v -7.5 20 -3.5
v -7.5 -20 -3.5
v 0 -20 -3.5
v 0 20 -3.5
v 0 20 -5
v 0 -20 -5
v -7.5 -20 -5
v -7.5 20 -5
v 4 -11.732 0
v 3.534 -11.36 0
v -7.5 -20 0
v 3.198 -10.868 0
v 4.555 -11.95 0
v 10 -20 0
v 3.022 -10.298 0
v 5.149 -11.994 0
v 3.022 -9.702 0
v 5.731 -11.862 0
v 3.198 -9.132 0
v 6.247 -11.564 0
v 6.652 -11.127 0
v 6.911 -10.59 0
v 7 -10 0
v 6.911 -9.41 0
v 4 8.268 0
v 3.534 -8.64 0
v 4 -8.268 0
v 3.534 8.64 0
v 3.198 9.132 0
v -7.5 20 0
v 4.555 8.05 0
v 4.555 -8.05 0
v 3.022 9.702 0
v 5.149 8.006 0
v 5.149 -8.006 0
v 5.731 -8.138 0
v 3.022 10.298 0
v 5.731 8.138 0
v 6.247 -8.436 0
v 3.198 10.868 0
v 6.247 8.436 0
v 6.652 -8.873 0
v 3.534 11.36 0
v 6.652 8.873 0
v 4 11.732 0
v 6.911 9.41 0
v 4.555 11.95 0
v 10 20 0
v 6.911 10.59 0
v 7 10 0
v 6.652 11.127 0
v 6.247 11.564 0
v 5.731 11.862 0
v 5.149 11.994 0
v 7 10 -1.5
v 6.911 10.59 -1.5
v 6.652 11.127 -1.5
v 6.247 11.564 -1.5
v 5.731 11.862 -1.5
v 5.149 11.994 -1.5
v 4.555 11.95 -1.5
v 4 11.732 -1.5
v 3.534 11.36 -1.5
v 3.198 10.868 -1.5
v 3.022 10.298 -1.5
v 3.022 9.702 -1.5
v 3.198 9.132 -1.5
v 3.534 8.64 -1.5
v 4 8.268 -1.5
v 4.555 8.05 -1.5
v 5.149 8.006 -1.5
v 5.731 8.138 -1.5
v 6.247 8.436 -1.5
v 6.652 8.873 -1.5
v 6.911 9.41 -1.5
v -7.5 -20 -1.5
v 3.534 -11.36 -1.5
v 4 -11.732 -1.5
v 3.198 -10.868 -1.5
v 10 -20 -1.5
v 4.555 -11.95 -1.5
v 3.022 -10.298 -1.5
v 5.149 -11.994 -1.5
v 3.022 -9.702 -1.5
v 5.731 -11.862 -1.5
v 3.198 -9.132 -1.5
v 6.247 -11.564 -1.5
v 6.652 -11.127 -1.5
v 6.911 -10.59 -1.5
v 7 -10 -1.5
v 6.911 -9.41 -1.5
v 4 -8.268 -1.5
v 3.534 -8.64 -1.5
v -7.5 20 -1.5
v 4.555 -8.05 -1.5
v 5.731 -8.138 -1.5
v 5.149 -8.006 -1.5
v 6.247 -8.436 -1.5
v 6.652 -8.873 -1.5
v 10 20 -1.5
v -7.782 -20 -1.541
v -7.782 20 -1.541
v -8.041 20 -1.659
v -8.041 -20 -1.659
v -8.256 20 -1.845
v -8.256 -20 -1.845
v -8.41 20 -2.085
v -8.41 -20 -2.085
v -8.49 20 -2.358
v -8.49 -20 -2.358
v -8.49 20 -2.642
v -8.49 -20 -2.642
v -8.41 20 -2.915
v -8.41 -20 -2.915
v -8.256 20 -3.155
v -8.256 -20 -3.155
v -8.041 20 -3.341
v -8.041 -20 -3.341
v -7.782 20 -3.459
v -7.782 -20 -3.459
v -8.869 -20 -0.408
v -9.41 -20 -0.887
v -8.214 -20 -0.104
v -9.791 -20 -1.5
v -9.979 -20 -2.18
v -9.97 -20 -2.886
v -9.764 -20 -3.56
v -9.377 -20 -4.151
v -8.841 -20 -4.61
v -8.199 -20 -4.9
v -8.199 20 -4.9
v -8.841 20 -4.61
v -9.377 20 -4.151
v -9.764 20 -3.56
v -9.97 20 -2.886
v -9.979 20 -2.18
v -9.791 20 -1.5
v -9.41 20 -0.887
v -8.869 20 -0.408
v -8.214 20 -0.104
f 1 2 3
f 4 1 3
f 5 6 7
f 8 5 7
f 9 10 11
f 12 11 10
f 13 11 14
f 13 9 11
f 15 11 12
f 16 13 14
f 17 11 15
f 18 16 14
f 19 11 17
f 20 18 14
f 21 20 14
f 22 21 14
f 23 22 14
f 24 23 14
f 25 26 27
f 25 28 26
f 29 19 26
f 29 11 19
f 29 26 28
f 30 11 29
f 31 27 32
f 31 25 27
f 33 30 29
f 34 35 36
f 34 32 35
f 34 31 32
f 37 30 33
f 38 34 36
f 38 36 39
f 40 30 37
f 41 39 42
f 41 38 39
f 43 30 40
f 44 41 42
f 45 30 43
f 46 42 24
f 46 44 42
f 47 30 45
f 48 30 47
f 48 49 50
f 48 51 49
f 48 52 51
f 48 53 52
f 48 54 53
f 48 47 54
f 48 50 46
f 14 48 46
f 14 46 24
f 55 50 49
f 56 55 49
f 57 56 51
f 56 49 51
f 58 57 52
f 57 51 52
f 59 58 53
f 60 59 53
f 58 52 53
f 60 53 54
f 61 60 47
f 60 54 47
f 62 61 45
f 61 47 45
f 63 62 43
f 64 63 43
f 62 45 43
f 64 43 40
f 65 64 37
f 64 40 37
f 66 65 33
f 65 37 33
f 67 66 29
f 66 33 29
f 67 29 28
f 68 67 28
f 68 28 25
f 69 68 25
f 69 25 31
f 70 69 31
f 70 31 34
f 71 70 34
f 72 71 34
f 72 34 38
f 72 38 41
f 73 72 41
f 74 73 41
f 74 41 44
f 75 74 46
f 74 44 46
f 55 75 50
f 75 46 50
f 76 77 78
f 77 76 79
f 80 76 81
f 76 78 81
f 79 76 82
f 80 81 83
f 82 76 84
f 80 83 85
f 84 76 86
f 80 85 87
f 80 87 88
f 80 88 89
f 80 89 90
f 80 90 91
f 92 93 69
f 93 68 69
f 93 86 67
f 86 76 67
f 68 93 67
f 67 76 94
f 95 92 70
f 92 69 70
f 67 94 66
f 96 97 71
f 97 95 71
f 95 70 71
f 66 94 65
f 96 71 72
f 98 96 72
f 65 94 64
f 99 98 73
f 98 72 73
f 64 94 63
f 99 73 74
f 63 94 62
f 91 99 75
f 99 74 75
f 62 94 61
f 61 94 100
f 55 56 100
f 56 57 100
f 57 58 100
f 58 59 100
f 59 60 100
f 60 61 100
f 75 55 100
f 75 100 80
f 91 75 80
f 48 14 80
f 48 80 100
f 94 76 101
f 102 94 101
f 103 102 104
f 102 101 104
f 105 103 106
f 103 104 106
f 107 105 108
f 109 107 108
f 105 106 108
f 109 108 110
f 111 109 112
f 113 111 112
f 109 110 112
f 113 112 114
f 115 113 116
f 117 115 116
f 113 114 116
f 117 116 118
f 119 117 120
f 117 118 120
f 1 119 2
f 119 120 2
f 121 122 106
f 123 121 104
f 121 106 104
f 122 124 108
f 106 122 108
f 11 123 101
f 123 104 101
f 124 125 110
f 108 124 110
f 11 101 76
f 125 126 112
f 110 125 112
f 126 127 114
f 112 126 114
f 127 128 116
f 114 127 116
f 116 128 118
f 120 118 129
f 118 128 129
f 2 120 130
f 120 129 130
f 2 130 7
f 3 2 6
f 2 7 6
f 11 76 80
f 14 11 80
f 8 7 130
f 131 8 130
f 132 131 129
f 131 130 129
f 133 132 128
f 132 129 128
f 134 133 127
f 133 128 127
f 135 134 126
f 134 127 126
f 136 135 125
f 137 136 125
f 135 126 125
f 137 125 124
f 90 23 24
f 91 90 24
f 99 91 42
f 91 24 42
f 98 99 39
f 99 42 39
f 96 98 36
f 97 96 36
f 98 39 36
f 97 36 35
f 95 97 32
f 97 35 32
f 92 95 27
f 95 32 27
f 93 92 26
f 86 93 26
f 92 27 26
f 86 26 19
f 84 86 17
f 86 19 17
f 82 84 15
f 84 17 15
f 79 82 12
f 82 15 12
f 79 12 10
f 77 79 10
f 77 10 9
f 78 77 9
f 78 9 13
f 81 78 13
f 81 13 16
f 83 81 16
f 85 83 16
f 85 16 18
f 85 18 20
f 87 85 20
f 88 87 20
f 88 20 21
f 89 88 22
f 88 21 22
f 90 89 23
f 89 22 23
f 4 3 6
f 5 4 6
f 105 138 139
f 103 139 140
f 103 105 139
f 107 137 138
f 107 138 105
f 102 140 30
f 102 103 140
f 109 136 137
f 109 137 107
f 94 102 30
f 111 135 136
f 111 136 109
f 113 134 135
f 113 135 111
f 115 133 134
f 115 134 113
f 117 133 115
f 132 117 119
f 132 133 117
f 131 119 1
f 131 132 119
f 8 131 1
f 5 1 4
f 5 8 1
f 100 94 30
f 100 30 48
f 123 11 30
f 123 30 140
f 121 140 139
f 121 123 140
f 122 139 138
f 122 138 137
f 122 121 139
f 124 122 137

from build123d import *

# Parameters (mm, degrees)
SKETCH_1_W             = 20
SKETCH_1_H             = 40
SKETCH_1_R             = 2
SM_BASE_FLANGE_1_DEPTH = 1.5
OTHER_START            = -20
OTHER_1_DEPTH          = 40
OTHER_1_2_DEPTH        = 40


# Read off the part's stored shape, not the designer's step: 褶边1
# Sheet-metal steps are written as plain solids
with BuildPart() as part:
    # Sketch 1 → 基体-法兰1 (new body)
    with BuildSketch(Plane.XY):
        Rectangle(SKETCH_1_W, SKETCH_1_H)
        with Locations((5, 10)):
            Circle(SKETCH_1_R, mode=Mode.SUBTRACT)
        with Locations((5, -10)):
            Circle(SKETCH_1_R, mode=Mode.SUBTRACT)
    extrude(amount=-SM_BASE_FLANGE_1_DEPTH)

    # Other 1 outline → Other 1 (cut)
    with BuildSketch(Plane(origin=(0, 0, 0), x_dir=(1, 0, 0), z_dir=(0, 1, 0)).offset(OTHER_START)):
        with BuildLine():
            ThreePointArc((-7.5, 0), (-8.869306394, 0.408349934), (-9.791287847, 1.5))
            Line((-9.791287847, 1.5), (-10, 1.5))
            Line((-10, 1.5), (-10, 0))
            Line((-10, 0), (-7.5, 0))
        make_face()
    extrude(amount=OTHER_1_DEPTH, mode=Mode.SUBTRACT)

    # Other 1 2 outline → Other 1 2 (add)
    with BuildSketch(Plane(origin=(0, 0, 0), x_dir=(1, 0, 0), z_dir=(0, 1, 0)).offset(OTHER_START)):
        with BuildLine():
            Line((0, 3.5), (0, 5))
            Line((0, 5), (-7.5, 5))
            ThreePointArc((-7.5, 5), (-9.591650066, 3.869306394), (-9.791287847, 1.5))
            Line((-9.791287847, 1.5), (-7.5, 1.5))
            ThreePointArc((-7.5, 1.5), (-8.5, 2.5), (-7.5, 3.5))
            Line((-7.5, 3.5), (0, 3.5))
        make_face()
    extrude(amount=OTHER_1_2_DEPTH)


solid = part.part
